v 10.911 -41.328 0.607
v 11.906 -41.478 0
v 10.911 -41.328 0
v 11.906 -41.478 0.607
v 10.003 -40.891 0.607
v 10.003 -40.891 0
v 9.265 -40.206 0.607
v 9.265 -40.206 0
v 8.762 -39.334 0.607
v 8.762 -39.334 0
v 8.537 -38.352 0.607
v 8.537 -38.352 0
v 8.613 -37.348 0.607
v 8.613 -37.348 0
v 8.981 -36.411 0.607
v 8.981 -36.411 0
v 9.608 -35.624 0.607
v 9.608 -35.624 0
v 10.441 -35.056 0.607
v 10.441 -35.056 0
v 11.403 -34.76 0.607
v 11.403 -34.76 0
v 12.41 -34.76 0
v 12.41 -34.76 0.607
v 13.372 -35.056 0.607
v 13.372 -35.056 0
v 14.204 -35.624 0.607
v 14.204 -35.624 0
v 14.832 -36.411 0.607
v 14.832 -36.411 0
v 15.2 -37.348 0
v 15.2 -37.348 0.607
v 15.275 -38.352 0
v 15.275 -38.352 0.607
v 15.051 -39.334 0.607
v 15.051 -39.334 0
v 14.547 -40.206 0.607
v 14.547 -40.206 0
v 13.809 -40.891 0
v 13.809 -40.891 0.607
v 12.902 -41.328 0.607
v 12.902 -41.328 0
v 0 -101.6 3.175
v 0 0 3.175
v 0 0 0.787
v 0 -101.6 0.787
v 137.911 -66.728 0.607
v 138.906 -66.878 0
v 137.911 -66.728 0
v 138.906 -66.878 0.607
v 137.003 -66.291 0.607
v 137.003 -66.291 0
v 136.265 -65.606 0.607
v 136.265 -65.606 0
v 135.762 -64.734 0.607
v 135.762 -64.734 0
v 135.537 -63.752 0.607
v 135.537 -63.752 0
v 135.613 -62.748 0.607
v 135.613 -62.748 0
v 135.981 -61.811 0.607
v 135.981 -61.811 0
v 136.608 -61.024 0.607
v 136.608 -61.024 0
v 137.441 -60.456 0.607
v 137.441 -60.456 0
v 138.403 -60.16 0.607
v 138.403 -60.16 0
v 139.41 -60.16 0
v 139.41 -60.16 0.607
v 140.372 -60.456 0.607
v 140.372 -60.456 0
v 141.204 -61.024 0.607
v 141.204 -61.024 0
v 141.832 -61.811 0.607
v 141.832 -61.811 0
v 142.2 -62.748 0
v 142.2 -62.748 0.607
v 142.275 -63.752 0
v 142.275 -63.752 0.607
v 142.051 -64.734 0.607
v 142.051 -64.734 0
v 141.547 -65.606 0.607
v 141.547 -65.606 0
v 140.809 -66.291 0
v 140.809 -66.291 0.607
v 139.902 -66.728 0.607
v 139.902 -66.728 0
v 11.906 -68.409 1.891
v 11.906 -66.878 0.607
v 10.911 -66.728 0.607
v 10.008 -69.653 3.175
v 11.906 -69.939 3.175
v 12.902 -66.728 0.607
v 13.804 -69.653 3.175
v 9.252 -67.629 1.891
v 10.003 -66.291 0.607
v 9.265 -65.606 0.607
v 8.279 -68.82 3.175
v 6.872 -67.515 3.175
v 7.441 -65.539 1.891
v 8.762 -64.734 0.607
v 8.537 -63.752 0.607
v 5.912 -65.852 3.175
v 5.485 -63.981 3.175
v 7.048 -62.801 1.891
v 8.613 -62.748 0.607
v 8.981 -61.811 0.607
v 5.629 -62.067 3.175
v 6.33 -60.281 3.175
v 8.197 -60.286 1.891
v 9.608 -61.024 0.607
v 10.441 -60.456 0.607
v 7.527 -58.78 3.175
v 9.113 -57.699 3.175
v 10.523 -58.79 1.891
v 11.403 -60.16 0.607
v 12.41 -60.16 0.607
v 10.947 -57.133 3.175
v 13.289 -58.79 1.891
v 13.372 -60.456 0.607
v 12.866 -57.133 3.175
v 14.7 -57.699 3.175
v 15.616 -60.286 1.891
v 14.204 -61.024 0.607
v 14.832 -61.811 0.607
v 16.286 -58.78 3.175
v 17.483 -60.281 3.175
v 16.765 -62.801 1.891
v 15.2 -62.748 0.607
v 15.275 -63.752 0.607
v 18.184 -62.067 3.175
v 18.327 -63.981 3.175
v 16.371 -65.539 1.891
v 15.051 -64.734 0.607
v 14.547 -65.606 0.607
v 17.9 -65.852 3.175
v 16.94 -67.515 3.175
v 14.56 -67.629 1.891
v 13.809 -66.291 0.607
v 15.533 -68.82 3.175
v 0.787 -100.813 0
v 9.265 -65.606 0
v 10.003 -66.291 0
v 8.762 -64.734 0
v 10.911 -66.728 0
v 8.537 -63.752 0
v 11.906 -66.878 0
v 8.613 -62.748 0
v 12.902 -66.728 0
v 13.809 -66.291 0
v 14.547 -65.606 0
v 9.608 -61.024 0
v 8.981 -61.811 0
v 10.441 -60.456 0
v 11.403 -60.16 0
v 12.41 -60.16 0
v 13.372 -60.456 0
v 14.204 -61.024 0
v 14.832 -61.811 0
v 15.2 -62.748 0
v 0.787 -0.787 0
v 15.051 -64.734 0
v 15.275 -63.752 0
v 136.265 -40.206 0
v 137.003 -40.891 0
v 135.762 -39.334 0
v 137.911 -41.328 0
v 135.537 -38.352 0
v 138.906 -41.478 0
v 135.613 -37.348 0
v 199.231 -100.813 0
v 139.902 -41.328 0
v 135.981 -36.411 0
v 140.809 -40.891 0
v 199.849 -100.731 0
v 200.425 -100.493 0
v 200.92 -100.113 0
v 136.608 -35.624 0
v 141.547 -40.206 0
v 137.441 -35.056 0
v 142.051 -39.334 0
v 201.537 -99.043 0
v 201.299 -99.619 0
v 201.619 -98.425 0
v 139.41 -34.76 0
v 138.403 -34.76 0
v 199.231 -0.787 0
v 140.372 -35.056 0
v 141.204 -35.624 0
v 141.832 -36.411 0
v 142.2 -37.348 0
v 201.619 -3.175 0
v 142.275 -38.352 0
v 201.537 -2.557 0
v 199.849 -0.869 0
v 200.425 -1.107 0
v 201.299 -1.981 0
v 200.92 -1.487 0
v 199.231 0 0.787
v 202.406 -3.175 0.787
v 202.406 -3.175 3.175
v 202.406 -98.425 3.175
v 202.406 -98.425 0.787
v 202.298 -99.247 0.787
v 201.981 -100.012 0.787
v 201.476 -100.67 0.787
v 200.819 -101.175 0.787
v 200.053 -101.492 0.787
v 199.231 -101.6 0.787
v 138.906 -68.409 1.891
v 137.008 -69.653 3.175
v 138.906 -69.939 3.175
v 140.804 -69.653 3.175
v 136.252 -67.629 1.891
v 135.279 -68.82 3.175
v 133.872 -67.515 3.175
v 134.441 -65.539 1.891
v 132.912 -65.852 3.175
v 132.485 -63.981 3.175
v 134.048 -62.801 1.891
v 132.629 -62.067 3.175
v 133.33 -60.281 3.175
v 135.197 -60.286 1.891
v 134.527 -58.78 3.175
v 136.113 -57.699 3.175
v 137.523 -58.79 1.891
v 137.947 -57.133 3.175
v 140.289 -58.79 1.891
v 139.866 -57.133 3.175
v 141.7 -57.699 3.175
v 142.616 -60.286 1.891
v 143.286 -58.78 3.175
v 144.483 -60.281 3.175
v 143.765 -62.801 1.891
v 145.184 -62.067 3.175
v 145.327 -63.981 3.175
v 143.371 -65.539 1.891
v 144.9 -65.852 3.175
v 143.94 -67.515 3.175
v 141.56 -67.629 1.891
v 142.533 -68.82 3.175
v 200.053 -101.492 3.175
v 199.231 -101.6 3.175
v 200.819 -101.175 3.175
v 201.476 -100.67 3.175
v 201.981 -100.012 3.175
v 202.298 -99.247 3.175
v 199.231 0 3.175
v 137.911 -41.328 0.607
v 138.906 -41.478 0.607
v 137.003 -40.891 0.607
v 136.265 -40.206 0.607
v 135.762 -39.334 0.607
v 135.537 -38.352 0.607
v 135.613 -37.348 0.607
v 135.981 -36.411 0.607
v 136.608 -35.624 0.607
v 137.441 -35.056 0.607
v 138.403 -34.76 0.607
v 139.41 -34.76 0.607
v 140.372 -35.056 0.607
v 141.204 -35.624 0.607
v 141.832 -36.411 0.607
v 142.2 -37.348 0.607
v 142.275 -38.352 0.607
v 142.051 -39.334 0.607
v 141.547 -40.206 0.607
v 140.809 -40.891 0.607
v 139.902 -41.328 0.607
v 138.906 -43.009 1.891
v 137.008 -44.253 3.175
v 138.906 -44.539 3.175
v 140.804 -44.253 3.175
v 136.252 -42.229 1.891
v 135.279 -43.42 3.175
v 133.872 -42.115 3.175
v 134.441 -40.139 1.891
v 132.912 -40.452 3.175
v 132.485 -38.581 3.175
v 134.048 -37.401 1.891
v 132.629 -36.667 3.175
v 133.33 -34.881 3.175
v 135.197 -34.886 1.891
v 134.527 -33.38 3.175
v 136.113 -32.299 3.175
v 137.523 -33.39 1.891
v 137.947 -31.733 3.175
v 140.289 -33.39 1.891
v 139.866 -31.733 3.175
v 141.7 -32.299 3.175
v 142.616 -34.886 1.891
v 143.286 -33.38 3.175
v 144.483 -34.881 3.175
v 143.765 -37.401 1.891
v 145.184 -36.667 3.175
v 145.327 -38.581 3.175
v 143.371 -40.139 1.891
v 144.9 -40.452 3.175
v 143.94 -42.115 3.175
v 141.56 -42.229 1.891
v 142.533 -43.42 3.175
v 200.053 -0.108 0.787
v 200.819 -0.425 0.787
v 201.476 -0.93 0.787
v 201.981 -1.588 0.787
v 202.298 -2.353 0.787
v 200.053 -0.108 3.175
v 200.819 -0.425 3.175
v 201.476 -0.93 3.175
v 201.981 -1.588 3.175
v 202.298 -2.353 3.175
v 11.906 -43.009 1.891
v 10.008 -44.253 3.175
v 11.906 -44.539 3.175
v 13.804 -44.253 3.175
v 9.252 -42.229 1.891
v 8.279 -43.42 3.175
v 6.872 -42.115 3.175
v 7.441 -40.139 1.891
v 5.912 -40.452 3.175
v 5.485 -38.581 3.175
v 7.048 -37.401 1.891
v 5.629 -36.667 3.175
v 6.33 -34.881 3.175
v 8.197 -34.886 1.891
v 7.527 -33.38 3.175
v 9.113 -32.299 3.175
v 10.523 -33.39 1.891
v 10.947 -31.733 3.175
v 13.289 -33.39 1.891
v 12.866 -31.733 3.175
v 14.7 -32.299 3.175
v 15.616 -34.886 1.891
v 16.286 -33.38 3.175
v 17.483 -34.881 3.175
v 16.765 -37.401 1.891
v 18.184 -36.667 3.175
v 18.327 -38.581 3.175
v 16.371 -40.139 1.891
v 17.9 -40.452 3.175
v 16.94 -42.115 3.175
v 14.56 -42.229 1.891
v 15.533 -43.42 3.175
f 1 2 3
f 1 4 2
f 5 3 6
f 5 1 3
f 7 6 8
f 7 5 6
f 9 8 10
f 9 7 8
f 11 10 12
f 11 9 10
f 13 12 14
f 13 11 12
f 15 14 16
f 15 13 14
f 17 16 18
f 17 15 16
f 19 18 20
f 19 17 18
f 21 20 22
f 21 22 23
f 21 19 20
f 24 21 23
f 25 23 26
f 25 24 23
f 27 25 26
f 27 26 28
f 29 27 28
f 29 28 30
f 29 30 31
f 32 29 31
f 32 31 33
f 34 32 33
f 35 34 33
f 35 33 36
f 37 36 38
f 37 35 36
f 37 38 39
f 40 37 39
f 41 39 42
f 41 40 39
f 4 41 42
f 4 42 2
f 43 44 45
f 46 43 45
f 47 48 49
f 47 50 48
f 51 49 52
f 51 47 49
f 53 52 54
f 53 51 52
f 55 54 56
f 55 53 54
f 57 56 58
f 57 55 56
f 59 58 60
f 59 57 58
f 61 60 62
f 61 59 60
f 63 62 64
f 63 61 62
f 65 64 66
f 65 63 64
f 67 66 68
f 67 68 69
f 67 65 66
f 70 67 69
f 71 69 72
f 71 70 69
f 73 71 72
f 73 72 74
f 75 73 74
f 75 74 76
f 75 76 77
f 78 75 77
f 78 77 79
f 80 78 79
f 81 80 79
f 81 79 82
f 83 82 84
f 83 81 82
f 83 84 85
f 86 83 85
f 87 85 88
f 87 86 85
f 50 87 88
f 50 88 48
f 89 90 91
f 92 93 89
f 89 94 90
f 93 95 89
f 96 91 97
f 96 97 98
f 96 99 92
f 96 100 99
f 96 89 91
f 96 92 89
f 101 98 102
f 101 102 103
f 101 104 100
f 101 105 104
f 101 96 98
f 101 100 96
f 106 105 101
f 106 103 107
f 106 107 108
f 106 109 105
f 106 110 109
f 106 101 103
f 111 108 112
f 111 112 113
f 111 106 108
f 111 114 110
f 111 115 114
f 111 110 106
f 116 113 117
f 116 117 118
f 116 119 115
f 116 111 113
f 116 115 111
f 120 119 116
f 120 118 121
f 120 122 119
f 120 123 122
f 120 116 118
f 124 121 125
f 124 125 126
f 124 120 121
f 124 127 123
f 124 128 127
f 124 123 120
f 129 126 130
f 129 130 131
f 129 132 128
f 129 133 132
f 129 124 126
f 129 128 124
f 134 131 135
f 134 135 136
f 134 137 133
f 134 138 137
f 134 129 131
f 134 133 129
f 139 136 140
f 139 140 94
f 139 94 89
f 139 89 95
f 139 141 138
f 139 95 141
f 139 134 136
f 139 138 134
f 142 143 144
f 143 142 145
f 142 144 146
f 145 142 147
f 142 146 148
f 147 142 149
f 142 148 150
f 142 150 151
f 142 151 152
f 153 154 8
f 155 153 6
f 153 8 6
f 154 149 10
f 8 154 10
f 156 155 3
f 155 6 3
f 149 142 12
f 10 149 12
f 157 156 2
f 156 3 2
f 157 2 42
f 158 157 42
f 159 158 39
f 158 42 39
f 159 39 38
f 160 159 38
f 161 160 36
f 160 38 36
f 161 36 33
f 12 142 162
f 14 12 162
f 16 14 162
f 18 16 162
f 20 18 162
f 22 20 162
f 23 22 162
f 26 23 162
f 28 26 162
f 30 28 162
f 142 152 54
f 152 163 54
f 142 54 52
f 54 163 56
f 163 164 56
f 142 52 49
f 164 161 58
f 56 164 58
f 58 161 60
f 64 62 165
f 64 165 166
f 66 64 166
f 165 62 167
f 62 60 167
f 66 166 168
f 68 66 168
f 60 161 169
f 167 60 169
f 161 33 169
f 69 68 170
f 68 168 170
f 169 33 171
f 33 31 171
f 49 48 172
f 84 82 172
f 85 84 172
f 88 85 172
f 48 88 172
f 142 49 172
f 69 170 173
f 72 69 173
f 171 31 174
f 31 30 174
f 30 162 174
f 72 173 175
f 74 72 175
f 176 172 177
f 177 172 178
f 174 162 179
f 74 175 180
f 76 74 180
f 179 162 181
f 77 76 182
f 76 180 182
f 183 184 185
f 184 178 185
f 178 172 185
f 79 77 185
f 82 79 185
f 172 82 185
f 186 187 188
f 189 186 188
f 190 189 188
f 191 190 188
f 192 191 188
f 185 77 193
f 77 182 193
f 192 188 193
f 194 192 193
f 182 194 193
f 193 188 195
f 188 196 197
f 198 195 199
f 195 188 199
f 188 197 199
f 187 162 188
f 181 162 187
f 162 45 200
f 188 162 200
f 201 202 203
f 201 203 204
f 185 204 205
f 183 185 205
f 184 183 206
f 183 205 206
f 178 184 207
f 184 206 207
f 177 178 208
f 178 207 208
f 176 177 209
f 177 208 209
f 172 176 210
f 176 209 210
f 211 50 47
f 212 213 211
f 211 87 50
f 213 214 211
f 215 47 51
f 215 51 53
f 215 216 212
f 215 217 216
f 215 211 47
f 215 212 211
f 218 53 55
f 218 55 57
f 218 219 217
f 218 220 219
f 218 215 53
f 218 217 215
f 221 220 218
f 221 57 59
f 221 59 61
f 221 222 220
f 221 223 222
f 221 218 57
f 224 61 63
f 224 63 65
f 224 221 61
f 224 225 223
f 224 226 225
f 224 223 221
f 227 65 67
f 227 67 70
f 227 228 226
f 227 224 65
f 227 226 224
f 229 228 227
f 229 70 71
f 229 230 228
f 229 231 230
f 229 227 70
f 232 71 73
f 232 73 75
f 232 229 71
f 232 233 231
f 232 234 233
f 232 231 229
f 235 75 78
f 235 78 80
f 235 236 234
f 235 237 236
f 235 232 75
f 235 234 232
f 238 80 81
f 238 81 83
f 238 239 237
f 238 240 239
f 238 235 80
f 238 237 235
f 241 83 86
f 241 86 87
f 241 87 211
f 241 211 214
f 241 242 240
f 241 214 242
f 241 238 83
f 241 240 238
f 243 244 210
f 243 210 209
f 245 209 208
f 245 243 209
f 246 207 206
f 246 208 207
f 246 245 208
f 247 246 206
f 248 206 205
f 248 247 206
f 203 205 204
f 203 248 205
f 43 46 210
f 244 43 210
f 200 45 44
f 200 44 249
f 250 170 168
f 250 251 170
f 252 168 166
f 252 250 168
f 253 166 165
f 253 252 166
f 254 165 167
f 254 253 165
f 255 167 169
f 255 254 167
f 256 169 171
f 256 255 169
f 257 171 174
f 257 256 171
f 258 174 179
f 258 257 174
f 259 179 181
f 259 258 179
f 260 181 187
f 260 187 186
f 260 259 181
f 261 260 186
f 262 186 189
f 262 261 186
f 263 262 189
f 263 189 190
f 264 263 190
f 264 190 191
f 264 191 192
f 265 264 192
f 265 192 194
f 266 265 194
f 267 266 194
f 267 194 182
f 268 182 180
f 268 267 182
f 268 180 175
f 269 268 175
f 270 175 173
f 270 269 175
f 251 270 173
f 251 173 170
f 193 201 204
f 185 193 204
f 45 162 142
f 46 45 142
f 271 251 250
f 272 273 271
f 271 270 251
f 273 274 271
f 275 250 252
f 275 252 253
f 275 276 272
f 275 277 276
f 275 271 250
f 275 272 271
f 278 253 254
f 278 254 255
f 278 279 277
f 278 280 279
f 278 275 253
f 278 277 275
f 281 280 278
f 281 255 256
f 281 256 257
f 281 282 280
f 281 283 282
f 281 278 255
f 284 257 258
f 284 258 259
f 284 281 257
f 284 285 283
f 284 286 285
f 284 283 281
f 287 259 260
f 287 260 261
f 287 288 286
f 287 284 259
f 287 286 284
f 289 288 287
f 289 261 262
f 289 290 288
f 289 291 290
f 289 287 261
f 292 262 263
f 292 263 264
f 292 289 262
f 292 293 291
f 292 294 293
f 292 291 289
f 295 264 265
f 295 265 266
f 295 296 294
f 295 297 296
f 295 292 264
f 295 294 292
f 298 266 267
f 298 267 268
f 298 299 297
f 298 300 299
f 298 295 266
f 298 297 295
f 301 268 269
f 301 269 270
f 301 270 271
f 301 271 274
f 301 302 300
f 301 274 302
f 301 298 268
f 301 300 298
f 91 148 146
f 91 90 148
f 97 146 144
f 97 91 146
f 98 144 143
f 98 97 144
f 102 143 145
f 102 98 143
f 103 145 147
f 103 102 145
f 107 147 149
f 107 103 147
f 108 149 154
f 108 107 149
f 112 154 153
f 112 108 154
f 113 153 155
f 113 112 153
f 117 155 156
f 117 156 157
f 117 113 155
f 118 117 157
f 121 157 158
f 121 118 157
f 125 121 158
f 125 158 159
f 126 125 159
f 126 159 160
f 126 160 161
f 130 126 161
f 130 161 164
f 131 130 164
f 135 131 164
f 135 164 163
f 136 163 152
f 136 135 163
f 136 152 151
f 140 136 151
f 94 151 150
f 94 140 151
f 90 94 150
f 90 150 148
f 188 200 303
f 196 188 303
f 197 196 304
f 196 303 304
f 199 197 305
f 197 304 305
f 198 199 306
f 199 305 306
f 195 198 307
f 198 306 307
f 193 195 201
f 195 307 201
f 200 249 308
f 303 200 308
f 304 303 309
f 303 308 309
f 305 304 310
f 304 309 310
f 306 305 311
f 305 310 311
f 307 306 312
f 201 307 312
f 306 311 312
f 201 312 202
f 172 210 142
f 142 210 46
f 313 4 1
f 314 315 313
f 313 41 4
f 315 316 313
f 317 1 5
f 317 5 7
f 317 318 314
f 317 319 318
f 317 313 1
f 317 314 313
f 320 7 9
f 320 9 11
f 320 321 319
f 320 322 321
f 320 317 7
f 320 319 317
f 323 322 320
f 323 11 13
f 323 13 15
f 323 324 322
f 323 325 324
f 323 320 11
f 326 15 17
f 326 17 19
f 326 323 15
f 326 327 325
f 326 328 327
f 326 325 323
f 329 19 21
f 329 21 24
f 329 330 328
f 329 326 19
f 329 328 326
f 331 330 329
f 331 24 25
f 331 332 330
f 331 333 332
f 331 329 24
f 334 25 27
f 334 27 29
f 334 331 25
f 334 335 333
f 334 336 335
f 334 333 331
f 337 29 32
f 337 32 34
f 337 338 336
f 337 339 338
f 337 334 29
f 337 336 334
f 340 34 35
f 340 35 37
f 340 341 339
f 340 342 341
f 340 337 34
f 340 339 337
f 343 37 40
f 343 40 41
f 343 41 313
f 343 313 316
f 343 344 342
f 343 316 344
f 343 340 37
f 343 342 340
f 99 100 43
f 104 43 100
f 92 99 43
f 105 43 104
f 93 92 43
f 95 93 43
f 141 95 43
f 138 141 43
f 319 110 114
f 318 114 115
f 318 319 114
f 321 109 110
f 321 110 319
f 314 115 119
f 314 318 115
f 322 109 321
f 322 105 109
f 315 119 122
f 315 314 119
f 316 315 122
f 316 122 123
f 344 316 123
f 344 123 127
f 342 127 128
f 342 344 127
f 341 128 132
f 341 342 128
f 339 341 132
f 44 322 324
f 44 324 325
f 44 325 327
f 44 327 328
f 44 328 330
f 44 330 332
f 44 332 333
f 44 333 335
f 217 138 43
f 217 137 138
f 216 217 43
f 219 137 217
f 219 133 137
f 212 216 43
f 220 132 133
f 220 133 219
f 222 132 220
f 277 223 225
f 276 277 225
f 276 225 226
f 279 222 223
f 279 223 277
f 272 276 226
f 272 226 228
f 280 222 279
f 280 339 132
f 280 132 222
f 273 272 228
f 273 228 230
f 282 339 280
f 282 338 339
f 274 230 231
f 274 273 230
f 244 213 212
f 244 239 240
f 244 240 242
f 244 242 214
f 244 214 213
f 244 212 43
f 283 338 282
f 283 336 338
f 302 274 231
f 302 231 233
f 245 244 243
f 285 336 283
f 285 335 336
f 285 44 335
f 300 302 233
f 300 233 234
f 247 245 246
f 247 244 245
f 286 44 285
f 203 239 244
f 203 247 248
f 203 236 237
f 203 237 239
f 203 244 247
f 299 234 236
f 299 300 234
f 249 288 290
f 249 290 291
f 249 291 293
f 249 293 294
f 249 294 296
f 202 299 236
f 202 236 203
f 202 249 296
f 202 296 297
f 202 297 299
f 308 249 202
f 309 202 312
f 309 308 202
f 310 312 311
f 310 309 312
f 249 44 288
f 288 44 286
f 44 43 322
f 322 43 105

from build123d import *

# Parameters (mm, degrees)
SKETCH1_W                                   = 202.40625
SKETCH1_H                                   = 3.175
BOSS_EXTRUDE1_DEPTH                         = 101.6
CSK_FOR_1_4_FLAT_HEAD_MACHINE_SCREW_2_COUNT = 2
CSK_FOR_1_4_FLAT_HEAD_MACHINE_SCREW_2_PITCH = 25.4
CSK_FOR_1_4_FLAT_HEAD_MACHINE_SCREW_3_COUNT = 2
CSK_FOR_1_4_FLAT_HEAD_MACHINE_SCREW_3_PITCH = 129.515095645
CSK_FOR_1_4_FLAT_HEAD_MACHINE_SCREW_4_COUNT = 2
CSK_FOR_1_4_FLAT_HEAD_MACHINE_SCREW_4_PITCH = 127
CUT_EXTRUDE1_DEPTH                          = 4.175
CHAMFER1_SIZE                               = 0.7874


with BuildPart() as part:
    # Sketch1 → Boss-Extrude1 (new body)
    with BuildSketch(Plane(origin=(0, 0, 0), x_dir=(1, 0, 0), z_dir=(0, 1, 0))):
        with Locations((101.203125, -1.5875)):
            Rectangle(SKETCH1_W, SKETCH1_H)
    extrude(amount=-BOSS_EXTRUDE1_DEPTH)

    # Sketch15 → CSK for 1/4 Flat Head Machine Screw (100)5 (revolve, cut)
    with BuildSketch(Plane(origin=(11.90625, -38.1, 3.175), x_dir=(0, -1, 0), z_dir=(1, 0, 0))):
        Polygon((0, 0), (0, 3.175), (3.3782, 3.175), (3.3782, 2.568232241), (6.4389, 0), align=None)
    csk_for_1_4_flat_head_machine_screw_100 = revolve(axis=Axis((11.90625, -38.1, 9.525), (0, 0, -1)), mode=Mode.SUBTRACT)

    # CSK for 1_4 Flat Head Machine Screw  2: CSK for 1/4 Flat Head Machine Screw (100)5 ×2
    with Locations(*[(0, -i * CSK_FOR_1_4_FLAT_HEAD_MACHINE_SCREW_2_PITCH, 0) for i in range(1, CSK_FOR_1_4_FLAT_HEAD_MACHINE_SCREW_2_COUNT)]):
        add(csk_for_1_4_flat_head_machine_screw_100, mode=Mode.SUBTRACT)

    # CSK for 1_4 Flat Head Machine Screw  3: CSK for 1/4 Flat Head Machine Screw (100)5 ×2
    with Locations(*[Vector(0.980580676, -0.196116135, 0) * (i * CSK_FOR_1_4_FLAT_HEAD_MACHINE_SCREW_3_PITCH) for i in range(1, CSK_FOR_1_4_FLAT_HEAD_MACHINE_SCREW_3_COUNT)]):
        add(csk_for_1_4_flat_head_machine_screw_100, mode=Mode.SUBTRACT)

    # CSK for 1_4 Flat Head Machine Screw  4: CSK for 1/4 Flat Head Machine Screw (100)5 ×2
    with Locations(*[(i * CSK_FOR_1_4_FLAT_HEAD_MACHINE_SCREW_4_PITCH, 0, 0) for i in range(1, CSK_FOR_1_4_FLAT_HEAD_MACHINE_SCREW_4_COUNT)]):
        add(csk_for_1_4_flat_head_machine_screw_100, mode=Mode.SUBTRACT)

    # Sketch17 → Cut-Extrude1 (cut, through all)
    with BuildSketch(Plane.XY.offset(3.175)):
        with BuildLine():
            Line((202.40625, -3.175), (202.40625, 0))
            Line((202.40625, 0), (199.23125, 0))
            ThreePointArc((199.23125, 0), (201.47631403, -0.92993597), (202.40625, -3.175))
        make_face()
        with BuildLine():
            Line((202.40625, -98.425), (202.40625, -101.6))
            Line((202.40625, -101.6), (199.23125, -101.6))
            ThreePointArc((199.23125, -101.6), (201.47631403, -100.67006403), (202.40625, -98.425))
        make_face()
    extrude(amount=-CUT_EXTRUDE1_DEPTH, mode=Mode.SUBTRACT)

    # Chamfer1
    chamfer1_edges = [part.edges().sort_by_distance(p)[0] for p in [
        (99.615625, 0, 0),
        (99.615625, -101.6, 0),
        (202.40625, -50.8, 0),
        (201.47631403, -0.92993597, 0),
        (201.47631403, -100.67006403, 0),
        (0, -50.8, 0),
    ]]
    chamfer(chamfer1_edges, length=CHAMFER1_SIZE)


solid = part.part
